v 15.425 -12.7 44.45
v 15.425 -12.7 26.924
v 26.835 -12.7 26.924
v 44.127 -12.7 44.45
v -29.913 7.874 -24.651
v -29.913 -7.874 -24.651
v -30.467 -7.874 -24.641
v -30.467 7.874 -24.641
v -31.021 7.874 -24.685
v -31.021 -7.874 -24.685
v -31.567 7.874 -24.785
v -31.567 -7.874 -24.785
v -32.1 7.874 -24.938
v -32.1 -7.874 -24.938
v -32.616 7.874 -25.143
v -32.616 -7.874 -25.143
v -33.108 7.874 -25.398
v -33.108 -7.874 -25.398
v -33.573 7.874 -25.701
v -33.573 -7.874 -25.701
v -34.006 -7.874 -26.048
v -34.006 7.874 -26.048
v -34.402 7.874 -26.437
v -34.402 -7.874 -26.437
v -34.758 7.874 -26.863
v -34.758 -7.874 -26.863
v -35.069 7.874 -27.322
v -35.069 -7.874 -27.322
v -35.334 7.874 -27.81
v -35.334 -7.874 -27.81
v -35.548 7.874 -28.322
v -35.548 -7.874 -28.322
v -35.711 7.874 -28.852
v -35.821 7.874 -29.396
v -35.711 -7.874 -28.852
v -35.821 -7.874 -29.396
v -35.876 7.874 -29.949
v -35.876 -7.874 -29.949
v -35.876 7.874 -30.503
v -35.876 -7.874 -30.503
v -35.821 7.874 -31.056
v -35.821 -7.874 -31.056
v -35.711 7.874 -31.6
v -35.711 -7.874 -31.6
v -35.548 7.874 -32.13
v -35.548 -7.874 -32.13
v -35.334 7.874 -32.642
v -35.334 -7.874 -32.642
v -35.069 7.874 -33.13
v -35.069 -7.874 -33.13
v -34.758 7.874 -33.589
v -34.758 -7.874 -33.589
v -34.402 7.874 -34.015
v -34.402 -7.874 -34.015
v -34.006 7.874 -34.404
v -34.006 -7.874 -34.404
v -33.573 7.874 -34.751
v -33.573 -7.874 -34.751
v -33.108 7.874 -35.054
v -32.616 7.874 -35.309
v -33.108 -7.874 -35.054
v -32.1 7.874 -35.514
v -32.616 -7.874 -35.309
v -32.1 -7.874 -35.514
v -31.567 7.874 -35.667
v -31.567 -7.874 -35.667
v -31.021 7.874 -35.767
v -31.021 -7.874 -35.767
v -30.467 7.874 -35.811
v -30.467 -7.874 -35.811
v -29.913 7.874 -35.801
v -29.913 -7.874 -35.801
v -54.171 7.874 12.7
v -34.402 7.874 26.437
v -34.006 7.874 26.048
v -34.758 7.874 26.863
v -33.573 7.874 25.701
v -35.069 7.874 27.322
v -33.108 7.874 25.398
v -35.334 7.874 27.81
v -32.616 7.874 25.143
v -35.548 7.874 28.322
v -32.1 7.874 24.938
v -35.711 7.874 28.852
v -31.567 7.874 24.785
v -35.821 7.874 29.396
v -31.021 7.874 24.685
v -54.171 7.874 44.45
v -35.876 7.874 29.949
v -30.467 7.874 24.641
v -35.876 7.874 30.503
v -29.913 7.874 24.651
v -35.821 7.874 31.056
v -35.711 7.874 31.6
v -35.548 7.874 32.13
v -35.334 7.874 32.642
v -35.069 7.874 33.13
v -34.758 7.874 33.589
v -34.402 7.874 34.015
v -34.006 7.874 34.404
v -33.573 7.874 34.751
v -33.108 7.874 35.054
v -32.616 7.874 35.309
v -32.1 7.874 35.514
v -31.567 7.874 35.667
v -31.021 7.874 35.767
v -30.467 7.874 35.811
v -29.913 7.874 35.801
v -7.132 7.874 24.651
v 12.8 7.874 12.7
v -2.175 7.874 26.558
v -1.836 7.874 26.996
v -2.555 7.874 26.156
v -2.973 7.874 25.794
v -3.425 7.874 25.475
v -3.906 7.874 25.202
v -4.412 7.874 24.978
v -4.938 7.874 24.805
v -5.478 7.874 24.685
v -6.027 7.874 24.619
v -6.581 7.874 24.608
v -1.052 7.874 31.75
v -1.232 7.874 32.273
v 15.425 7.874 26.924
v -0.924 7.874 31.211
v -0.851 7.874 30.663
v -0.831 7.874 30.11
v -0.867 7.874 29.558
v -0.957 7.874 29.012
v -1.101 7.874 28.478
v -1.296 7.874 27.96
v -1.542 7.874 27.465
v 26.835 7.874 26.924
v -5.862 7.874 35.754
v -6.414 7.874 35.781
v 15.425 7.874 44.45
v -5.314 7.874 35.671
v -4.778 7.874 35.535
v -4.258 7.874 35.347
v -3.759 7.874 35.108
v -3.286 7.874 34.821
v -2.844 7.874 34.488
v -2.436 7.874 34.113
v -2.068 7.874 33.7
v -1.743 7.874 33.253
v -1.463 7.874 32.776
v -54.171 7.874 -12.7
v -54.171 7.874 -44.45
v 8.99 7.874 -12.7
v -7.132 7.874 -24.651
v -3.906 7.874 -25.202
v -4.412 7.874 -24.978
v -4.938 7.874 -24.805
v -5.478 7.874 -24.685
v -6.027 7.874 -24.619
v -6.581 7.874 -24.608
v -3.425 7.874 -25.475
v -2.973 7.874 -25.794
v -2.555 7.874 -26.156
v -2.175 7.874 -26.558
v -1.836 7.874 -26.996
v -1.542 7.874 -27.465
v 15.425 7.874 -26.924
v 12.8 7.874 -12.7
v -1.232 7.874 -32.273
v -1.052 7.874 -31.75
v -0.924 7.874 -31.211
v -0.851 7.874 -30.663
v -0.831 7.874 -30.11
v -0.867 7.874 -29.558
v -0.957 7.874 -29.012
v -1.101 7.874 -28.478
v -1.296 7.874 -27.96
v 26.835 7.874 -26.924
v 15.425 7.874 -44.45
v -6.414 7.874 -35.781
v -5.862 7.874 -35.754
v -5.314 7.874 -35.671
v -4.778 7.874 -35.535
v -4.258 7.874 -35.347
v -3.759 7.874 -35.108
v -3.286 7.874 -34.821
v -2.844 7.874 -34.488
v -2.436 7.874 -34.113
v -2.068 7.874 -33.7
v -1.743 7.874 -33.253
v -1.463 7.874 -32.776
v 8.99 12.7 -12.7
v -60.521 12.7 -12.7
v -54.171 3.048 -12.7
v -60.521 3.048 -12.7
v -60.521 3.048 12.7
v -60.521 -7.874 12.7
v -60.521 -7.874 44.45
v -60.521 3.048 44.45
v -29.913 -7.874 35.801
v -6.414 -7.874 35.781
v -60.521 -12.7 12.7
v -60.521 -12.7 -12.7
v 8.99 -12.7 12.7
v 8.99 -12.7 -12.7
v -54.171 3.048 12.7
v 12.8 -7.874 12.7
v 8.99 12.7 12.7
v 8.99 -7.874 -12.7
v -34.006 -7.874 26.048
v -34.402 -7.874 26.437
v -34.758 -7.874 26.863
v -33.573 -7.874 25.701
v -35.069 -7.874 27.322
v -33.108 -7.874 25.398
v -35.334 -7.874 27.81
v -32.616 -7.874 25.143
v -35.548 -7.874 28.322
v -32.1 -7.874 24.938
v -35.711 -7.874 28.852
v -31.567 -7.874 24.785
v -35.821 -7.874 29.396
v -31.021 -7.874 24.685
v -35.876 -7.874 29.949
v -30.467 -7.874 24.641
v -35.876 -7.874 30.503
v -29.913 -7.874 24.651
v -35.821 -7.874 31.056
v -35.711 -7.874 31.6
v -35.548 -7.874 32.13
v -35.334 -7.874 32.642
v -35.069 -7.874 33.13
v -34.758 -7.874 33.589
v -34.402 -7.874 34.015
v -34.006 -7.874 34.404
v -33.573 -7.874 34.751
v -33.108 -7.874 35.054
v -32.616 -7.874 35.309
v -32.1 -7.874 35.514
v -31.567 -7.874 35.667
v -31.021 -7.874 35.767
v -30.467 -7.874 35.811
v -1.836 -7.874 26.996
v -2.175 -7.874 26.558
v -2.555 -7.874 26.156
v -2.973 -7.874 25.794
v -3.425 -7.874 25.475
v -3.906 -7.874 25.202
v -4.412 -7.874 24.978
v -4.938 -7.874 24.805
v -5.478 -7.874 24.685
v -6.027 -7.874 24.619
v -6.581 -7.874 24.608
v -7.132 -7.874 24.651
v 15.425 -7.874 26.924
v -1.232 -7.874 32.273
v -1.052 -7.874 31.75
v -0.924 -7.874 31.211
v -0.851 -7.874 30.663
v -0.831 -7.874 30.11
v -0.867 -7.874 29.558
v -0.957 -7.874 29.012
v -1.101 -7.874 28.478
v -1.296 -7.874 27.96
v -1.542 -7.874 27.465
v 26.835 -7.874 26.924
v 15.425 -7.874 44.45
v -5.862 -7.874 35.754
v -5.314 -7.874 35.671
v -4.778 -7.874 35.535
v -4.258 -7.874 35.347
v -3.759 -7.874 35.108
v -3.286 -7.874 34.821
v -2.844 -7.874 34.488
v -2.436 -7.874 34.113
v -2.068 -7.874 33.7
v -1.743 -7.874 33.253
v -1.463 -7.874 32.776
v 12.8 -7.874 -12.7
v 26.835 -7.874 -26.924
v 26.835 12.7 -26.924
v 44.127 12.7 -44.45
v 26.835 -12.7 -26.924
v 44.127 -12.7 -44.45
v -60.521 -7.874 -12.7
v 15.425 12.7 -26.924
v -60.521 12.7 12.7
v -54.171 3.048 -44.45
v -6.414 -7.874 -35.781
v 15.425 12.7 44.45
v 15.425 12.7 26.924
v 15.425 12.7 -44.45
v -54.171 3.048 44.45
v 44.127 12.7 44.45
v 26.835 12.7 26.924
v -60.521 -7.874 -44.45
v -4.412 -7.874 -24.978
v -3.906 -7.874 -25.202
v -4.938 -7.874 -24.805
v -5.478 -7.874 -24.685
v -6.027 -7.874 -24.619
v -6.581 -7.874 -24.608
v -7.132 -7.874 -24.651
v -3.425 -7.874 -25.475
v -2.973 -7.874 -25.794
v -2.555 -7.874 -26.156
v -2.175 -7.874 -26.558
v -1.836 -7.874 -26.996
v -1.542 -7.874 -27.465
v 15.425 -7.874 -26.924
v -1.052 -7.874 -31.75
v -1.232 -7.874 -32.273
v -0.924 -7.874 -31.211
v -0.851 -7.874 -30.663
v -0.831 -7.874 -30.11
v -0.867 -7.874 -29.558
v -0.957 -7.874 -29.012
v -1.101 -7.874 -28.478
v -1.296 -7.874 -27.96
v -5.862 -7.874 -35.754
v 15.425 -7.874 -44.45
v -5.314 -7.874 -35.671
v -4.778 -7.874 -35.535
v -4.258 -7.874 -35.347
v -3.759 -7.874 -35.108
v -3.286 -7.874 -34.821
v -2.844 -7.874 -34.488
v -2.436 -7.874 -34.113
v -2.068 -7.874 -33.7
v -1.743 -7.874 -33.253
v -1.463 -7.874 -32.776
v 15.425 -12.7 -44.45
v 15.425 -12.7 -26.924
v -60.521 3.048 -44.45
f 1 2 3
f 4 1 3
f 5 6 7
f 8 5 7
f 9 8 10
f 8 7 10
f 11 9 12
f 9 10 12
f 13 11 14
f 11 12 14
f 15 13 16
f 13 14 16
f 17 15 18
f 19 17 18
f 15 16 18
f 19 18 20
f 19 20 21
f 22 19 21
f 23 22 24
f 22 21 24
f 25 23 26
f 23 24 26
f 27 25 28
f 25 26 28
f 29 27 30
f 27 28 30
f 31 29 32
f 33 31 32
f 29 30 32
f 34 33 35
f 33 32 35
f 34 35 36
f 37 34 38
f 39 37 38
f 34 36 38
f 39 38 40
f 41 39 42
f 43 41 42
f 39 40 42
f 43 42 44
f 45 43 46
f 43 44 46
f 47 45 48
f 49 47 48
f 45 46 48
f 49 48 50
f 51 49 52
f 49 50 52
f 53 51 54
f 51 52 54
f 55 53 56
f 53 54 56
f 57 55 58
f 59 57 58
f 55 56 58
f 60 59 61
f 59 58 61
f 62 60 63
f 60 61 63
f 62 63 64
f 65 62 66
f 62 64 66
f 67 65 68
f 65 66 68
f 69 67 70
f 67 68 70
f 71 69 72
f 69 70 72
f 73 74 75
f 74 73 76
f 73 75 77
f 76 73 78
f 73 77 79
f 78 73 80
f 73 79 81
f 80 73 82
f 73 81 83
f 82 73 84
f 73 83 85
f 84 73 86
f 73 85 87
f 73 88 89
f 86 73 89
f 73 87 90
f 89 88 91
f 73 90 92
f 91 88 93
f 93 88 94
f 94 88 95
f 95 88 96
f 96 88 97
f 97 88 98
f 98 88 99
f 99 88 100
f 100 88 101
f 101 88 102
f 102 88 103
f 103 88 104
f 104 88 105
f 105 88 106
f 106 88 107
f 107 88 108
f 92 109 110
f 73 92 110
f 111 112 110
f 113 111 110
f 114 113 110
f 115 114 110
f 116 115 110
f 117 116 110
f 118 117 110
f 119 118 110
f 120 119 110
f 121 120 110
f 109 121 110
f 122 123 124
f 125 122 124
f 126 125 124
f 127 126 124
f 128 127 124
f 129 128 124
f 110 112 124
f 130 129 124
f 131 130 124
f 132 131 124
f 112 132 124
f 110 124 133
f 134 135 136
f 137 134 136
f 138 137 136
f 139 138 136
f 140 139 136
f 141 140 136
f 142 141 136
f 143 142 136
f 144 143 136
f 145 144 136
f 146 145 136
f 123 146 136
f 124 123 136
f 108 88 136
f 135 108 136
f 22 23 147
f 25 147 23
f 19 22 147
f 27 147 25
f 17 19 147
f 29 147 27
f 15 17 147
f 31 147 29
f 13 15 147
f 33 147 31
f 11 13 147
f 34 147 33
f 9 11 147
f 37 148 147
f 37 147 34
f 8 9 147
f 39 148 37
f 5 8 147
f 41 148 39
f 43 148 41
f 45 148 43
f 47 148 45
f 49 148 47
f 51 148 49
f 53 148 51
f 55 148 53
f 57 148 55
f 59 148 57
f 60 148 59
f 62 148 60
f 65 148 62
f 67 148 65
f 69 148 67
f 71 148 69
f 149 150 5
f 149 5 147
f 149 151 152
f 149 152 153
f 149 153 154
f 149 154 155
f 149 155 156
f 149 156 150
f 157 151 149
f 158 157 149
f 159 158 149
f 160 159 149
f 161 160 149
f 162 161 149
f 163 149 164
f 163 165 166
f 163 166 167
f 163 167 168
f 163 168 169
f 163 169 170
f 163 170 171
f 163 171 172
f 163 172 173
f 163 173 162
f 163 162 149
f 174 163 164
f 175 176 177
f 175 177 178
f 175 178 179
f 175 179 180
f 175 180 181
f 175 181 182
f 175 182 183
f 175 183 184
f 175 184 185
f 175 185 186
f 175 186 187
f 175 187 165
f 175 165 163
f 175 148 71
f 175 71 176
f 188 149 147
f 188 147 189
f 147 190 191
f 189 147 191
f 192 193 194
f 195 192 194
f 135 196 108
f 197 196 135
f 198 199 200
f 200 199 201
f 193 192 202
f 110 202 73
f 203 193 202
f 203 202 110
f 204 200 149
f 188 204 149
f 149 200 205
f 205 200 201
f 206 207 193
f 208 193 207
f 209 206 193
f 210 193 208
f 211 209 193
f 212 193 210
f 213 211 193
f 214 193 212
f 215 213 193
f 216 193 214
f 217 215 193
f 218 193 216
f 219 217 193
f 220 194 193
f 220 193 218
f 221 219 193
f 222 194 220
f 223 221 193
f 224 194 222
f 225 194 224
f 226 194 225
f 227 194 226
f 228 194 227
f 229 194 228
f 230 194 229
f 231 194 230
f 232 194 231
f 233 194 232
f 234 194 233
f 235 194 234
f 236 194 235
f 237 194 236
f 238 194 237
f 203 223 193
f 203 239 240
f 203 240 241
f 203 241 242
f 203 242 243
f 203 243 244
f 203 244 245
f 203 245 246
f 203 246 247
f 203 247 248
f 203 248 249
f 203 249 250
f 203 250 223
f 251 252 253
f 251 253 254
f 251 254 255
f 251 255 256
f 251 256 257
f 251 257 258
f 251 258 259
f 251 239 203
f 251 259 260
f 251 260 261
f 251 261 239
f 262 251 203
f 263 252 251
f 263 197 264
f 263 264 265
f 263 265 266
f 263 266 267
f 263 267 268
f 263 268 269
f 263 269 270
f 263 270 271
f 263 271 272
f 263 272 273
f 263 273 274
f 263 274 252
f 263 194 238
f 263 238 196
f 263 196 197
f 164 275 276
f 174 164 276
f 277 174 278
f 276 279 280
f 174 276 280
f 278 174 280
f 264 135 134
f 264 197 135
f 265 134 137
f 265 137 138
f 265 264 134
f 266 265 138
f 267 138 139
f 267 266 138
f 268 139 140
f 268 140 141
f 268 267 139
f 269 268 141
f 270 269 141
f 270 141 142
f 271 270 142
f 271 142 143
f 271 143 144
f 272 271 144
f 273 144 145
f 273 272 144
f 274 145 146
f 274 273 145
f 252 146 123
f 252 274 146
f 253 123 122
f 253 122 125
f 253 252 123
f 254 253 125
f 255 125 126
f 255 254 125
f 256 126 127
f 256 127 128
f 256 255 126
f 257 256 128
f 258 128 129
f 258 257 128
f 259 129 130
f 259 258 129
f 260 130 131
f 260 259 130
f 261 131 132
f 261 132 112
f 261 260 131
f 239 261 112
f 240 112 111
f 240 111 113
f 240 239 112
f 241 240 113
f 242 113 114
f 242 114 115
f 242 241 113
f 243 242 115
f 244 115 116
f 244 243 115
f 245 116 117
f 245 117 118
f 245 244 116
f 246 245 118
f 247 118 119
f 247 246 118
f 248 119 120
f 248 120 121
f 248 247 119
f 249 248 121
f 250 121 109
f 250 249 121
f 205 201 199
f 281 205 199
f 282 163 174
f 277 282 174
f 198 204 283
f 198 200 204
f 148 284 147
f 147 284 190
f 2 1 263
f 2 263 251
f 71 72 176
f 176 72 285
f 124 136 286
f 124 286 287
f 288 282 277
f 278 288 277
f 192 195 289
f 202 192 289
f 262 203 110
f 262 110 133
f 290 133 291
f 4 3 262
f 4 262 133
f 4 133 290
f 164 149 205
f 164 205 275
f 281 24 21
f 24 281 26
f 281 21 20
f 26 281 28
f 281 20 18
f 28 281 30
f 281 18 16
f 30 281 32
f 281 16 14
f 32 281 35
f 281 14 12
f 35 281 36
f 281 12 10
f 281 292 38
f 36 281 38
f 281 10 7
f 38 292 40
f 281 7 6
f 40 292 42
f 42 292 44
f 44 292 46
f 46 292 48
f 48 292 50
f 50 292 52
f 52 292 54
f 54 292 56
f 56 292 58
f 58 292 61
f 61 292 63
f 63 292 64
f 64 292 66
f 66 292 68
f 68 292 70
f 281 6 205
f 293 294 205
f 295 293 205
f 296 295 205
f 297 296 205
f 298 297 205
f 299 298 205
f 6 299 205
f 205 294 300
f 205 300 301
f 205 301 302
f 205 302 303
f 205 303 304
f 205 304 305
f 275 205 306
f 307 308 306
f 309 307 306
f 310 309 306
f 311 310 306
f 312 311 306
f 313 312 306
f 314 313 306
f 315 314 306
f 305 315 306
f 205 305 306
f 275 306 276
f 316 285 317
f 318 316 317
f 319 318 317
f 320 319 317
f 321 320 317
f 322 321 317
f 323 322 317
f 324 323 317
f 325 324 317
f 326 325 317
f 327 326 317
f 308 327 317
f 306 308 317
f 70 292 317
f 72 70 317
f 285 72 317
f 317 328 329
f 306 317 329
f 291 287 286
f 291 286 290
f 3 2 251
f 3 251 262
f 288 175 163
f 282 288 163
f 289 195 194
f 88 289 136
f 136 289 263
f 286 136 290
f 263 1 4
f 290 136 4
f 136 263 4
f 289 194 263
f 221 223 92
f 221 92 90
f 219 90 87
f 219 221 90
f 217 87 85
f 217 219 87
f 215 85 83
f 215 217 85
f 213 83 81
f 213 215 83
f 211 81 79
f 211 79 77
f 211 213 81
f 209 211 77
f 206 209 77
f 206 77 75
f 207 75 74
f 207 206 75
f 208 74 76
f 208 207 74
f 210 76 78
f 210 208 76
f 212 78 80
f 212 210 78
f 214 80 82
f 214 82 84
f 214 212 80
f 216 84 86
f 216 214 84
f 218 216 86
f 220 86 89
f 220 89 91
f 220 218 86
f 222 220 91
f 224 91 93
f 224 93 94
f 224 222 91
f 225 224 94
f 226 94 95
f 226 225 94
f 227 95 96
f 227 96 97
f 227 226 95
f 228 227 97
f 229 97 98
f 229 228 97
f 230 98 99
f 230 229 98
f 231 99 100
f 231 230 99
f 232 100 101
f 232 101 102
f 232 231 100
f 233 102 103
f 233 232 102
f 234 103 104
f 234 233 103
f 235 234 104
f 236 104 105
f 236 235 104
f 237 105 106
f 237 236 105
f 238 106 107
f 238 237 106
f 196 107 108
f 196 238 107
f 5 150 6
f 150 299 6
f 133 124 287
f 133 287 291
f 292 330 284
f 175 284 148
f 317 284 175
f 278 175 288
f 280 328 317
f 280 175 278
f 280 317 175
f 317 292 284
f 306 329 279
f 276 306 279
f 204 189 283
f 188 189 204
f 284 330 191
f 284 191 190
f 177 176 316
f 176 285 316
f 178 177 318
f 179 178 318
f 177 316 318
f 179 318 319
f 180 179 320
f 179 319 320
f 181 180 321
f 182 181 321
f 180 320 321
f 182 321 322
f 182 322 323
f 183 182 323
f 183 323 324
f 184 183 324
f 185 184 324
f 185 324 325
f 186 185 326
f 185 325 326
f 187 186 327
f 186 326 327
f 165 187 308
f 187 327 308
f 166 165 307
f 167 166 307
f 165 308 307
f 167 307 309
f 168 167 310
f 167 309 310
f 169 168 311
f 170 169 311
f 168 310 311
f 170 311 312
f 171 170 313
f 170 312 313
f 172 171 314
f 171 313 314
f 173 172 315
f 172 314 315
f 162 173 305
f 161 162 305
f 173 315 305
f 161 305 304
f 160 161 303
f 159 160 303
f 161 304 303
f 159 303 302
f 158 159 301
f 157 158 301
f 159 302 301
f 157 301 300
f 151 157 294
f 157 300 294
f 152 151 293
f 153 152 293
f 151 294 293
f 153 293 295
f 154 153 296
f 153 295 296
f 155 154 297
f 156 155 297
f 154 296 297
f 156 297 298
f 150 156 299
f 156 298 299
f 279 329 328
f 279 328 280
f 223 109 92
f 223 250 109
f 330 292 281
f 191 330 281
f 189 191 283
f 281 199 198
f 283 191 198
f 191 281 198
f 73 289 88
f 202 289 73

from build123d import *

# Parameters (mm, degrees)
F1_DEPTH      = 12.7
F2_DEPTH      = 7.874
F0_W          = 6.35
F0_H          = 31.75
F3_DEPTH      = 7.874
F3_DEPTH_BACK = 3.048


with BuildPart() as f1:
    # F0 (on Front) → F1 (new body, symmetric)
    with BuildSketch(Plane.XZ):
        Polygon((-54.1707432052, 12.7), (-60.5207432052, 12.7), (-60.5207432052, 0), (8.9898571843, 0), (8.9898571843, 12.7), align=None)
    extrude(amount=F1_DEPTH, both=True)



with BuildPart() as f1b:
    # F0 (on Front) → F1, piece 2 (new body, symmetric)
    with BuildSketch(Plane.XZ):
        Polygon((44.1272567948, 44.45), (15.4252567948, 44.45), (15.4252567948, 26.924), (26.8345322098, 26.924), align=None)
    extrude(amount=F1_DEPTH, both=True)

    # F0 (on Front) → F2 (join, symmetric)
    with BuildSketch(Plane.XZ):
        Polygon((15.4252567948, 44.45), (-54.1707432052, 44.45), (-54.1707432052, 12.7), (8.9898571843, 12.7), (12.7998571843, 12.7), (26.8345322098, 26.924), (15.4252567948, 26.924), align=None)
        with BuildLine():
            ThreePointArc((-29.9125999436, 24.6510820161), (-35.8827432052, 30.226), (-29.9125999436, 35.8009179839))
            Line((-29.9125999436, 35.8009179839), (-6.4141126637, 35.7813519105))
            ThreePointArc((-6.4141126637, 35.7813519105), (-0.8423585797, 29.8335906051), (-7.1321847174, 24.6510820161))
            Line((-7.1321847174, 24.6510820161), (-29.9125999436, 24.6510820161))
        make_face(mode=Mode.SUBTRACT)
    extrude(amount=F2_DEPTH, both=True)

    # F0 (on Front) → F3 (join, two sides)
    with BuildSketch(Plane.XZ) as f3_sk:
        with Locations((-57.3457432052, 28.575)):
            Rectangle(F0_W, F0_H)
    extrude(amount=F3_DEPTH)
    extrude(f3_sk.sketch, amount=-F3_DEPTH_BACK)


with BuildPart() as f1_1:
    add(f1.part)
    # F4: F1b, F1 across plane
    add(f1b.part.mirror(Plane.XY))
    add(f1.part.mirror(Plane.XY))


solid = Compound([f1b.part, f1_1.part])
